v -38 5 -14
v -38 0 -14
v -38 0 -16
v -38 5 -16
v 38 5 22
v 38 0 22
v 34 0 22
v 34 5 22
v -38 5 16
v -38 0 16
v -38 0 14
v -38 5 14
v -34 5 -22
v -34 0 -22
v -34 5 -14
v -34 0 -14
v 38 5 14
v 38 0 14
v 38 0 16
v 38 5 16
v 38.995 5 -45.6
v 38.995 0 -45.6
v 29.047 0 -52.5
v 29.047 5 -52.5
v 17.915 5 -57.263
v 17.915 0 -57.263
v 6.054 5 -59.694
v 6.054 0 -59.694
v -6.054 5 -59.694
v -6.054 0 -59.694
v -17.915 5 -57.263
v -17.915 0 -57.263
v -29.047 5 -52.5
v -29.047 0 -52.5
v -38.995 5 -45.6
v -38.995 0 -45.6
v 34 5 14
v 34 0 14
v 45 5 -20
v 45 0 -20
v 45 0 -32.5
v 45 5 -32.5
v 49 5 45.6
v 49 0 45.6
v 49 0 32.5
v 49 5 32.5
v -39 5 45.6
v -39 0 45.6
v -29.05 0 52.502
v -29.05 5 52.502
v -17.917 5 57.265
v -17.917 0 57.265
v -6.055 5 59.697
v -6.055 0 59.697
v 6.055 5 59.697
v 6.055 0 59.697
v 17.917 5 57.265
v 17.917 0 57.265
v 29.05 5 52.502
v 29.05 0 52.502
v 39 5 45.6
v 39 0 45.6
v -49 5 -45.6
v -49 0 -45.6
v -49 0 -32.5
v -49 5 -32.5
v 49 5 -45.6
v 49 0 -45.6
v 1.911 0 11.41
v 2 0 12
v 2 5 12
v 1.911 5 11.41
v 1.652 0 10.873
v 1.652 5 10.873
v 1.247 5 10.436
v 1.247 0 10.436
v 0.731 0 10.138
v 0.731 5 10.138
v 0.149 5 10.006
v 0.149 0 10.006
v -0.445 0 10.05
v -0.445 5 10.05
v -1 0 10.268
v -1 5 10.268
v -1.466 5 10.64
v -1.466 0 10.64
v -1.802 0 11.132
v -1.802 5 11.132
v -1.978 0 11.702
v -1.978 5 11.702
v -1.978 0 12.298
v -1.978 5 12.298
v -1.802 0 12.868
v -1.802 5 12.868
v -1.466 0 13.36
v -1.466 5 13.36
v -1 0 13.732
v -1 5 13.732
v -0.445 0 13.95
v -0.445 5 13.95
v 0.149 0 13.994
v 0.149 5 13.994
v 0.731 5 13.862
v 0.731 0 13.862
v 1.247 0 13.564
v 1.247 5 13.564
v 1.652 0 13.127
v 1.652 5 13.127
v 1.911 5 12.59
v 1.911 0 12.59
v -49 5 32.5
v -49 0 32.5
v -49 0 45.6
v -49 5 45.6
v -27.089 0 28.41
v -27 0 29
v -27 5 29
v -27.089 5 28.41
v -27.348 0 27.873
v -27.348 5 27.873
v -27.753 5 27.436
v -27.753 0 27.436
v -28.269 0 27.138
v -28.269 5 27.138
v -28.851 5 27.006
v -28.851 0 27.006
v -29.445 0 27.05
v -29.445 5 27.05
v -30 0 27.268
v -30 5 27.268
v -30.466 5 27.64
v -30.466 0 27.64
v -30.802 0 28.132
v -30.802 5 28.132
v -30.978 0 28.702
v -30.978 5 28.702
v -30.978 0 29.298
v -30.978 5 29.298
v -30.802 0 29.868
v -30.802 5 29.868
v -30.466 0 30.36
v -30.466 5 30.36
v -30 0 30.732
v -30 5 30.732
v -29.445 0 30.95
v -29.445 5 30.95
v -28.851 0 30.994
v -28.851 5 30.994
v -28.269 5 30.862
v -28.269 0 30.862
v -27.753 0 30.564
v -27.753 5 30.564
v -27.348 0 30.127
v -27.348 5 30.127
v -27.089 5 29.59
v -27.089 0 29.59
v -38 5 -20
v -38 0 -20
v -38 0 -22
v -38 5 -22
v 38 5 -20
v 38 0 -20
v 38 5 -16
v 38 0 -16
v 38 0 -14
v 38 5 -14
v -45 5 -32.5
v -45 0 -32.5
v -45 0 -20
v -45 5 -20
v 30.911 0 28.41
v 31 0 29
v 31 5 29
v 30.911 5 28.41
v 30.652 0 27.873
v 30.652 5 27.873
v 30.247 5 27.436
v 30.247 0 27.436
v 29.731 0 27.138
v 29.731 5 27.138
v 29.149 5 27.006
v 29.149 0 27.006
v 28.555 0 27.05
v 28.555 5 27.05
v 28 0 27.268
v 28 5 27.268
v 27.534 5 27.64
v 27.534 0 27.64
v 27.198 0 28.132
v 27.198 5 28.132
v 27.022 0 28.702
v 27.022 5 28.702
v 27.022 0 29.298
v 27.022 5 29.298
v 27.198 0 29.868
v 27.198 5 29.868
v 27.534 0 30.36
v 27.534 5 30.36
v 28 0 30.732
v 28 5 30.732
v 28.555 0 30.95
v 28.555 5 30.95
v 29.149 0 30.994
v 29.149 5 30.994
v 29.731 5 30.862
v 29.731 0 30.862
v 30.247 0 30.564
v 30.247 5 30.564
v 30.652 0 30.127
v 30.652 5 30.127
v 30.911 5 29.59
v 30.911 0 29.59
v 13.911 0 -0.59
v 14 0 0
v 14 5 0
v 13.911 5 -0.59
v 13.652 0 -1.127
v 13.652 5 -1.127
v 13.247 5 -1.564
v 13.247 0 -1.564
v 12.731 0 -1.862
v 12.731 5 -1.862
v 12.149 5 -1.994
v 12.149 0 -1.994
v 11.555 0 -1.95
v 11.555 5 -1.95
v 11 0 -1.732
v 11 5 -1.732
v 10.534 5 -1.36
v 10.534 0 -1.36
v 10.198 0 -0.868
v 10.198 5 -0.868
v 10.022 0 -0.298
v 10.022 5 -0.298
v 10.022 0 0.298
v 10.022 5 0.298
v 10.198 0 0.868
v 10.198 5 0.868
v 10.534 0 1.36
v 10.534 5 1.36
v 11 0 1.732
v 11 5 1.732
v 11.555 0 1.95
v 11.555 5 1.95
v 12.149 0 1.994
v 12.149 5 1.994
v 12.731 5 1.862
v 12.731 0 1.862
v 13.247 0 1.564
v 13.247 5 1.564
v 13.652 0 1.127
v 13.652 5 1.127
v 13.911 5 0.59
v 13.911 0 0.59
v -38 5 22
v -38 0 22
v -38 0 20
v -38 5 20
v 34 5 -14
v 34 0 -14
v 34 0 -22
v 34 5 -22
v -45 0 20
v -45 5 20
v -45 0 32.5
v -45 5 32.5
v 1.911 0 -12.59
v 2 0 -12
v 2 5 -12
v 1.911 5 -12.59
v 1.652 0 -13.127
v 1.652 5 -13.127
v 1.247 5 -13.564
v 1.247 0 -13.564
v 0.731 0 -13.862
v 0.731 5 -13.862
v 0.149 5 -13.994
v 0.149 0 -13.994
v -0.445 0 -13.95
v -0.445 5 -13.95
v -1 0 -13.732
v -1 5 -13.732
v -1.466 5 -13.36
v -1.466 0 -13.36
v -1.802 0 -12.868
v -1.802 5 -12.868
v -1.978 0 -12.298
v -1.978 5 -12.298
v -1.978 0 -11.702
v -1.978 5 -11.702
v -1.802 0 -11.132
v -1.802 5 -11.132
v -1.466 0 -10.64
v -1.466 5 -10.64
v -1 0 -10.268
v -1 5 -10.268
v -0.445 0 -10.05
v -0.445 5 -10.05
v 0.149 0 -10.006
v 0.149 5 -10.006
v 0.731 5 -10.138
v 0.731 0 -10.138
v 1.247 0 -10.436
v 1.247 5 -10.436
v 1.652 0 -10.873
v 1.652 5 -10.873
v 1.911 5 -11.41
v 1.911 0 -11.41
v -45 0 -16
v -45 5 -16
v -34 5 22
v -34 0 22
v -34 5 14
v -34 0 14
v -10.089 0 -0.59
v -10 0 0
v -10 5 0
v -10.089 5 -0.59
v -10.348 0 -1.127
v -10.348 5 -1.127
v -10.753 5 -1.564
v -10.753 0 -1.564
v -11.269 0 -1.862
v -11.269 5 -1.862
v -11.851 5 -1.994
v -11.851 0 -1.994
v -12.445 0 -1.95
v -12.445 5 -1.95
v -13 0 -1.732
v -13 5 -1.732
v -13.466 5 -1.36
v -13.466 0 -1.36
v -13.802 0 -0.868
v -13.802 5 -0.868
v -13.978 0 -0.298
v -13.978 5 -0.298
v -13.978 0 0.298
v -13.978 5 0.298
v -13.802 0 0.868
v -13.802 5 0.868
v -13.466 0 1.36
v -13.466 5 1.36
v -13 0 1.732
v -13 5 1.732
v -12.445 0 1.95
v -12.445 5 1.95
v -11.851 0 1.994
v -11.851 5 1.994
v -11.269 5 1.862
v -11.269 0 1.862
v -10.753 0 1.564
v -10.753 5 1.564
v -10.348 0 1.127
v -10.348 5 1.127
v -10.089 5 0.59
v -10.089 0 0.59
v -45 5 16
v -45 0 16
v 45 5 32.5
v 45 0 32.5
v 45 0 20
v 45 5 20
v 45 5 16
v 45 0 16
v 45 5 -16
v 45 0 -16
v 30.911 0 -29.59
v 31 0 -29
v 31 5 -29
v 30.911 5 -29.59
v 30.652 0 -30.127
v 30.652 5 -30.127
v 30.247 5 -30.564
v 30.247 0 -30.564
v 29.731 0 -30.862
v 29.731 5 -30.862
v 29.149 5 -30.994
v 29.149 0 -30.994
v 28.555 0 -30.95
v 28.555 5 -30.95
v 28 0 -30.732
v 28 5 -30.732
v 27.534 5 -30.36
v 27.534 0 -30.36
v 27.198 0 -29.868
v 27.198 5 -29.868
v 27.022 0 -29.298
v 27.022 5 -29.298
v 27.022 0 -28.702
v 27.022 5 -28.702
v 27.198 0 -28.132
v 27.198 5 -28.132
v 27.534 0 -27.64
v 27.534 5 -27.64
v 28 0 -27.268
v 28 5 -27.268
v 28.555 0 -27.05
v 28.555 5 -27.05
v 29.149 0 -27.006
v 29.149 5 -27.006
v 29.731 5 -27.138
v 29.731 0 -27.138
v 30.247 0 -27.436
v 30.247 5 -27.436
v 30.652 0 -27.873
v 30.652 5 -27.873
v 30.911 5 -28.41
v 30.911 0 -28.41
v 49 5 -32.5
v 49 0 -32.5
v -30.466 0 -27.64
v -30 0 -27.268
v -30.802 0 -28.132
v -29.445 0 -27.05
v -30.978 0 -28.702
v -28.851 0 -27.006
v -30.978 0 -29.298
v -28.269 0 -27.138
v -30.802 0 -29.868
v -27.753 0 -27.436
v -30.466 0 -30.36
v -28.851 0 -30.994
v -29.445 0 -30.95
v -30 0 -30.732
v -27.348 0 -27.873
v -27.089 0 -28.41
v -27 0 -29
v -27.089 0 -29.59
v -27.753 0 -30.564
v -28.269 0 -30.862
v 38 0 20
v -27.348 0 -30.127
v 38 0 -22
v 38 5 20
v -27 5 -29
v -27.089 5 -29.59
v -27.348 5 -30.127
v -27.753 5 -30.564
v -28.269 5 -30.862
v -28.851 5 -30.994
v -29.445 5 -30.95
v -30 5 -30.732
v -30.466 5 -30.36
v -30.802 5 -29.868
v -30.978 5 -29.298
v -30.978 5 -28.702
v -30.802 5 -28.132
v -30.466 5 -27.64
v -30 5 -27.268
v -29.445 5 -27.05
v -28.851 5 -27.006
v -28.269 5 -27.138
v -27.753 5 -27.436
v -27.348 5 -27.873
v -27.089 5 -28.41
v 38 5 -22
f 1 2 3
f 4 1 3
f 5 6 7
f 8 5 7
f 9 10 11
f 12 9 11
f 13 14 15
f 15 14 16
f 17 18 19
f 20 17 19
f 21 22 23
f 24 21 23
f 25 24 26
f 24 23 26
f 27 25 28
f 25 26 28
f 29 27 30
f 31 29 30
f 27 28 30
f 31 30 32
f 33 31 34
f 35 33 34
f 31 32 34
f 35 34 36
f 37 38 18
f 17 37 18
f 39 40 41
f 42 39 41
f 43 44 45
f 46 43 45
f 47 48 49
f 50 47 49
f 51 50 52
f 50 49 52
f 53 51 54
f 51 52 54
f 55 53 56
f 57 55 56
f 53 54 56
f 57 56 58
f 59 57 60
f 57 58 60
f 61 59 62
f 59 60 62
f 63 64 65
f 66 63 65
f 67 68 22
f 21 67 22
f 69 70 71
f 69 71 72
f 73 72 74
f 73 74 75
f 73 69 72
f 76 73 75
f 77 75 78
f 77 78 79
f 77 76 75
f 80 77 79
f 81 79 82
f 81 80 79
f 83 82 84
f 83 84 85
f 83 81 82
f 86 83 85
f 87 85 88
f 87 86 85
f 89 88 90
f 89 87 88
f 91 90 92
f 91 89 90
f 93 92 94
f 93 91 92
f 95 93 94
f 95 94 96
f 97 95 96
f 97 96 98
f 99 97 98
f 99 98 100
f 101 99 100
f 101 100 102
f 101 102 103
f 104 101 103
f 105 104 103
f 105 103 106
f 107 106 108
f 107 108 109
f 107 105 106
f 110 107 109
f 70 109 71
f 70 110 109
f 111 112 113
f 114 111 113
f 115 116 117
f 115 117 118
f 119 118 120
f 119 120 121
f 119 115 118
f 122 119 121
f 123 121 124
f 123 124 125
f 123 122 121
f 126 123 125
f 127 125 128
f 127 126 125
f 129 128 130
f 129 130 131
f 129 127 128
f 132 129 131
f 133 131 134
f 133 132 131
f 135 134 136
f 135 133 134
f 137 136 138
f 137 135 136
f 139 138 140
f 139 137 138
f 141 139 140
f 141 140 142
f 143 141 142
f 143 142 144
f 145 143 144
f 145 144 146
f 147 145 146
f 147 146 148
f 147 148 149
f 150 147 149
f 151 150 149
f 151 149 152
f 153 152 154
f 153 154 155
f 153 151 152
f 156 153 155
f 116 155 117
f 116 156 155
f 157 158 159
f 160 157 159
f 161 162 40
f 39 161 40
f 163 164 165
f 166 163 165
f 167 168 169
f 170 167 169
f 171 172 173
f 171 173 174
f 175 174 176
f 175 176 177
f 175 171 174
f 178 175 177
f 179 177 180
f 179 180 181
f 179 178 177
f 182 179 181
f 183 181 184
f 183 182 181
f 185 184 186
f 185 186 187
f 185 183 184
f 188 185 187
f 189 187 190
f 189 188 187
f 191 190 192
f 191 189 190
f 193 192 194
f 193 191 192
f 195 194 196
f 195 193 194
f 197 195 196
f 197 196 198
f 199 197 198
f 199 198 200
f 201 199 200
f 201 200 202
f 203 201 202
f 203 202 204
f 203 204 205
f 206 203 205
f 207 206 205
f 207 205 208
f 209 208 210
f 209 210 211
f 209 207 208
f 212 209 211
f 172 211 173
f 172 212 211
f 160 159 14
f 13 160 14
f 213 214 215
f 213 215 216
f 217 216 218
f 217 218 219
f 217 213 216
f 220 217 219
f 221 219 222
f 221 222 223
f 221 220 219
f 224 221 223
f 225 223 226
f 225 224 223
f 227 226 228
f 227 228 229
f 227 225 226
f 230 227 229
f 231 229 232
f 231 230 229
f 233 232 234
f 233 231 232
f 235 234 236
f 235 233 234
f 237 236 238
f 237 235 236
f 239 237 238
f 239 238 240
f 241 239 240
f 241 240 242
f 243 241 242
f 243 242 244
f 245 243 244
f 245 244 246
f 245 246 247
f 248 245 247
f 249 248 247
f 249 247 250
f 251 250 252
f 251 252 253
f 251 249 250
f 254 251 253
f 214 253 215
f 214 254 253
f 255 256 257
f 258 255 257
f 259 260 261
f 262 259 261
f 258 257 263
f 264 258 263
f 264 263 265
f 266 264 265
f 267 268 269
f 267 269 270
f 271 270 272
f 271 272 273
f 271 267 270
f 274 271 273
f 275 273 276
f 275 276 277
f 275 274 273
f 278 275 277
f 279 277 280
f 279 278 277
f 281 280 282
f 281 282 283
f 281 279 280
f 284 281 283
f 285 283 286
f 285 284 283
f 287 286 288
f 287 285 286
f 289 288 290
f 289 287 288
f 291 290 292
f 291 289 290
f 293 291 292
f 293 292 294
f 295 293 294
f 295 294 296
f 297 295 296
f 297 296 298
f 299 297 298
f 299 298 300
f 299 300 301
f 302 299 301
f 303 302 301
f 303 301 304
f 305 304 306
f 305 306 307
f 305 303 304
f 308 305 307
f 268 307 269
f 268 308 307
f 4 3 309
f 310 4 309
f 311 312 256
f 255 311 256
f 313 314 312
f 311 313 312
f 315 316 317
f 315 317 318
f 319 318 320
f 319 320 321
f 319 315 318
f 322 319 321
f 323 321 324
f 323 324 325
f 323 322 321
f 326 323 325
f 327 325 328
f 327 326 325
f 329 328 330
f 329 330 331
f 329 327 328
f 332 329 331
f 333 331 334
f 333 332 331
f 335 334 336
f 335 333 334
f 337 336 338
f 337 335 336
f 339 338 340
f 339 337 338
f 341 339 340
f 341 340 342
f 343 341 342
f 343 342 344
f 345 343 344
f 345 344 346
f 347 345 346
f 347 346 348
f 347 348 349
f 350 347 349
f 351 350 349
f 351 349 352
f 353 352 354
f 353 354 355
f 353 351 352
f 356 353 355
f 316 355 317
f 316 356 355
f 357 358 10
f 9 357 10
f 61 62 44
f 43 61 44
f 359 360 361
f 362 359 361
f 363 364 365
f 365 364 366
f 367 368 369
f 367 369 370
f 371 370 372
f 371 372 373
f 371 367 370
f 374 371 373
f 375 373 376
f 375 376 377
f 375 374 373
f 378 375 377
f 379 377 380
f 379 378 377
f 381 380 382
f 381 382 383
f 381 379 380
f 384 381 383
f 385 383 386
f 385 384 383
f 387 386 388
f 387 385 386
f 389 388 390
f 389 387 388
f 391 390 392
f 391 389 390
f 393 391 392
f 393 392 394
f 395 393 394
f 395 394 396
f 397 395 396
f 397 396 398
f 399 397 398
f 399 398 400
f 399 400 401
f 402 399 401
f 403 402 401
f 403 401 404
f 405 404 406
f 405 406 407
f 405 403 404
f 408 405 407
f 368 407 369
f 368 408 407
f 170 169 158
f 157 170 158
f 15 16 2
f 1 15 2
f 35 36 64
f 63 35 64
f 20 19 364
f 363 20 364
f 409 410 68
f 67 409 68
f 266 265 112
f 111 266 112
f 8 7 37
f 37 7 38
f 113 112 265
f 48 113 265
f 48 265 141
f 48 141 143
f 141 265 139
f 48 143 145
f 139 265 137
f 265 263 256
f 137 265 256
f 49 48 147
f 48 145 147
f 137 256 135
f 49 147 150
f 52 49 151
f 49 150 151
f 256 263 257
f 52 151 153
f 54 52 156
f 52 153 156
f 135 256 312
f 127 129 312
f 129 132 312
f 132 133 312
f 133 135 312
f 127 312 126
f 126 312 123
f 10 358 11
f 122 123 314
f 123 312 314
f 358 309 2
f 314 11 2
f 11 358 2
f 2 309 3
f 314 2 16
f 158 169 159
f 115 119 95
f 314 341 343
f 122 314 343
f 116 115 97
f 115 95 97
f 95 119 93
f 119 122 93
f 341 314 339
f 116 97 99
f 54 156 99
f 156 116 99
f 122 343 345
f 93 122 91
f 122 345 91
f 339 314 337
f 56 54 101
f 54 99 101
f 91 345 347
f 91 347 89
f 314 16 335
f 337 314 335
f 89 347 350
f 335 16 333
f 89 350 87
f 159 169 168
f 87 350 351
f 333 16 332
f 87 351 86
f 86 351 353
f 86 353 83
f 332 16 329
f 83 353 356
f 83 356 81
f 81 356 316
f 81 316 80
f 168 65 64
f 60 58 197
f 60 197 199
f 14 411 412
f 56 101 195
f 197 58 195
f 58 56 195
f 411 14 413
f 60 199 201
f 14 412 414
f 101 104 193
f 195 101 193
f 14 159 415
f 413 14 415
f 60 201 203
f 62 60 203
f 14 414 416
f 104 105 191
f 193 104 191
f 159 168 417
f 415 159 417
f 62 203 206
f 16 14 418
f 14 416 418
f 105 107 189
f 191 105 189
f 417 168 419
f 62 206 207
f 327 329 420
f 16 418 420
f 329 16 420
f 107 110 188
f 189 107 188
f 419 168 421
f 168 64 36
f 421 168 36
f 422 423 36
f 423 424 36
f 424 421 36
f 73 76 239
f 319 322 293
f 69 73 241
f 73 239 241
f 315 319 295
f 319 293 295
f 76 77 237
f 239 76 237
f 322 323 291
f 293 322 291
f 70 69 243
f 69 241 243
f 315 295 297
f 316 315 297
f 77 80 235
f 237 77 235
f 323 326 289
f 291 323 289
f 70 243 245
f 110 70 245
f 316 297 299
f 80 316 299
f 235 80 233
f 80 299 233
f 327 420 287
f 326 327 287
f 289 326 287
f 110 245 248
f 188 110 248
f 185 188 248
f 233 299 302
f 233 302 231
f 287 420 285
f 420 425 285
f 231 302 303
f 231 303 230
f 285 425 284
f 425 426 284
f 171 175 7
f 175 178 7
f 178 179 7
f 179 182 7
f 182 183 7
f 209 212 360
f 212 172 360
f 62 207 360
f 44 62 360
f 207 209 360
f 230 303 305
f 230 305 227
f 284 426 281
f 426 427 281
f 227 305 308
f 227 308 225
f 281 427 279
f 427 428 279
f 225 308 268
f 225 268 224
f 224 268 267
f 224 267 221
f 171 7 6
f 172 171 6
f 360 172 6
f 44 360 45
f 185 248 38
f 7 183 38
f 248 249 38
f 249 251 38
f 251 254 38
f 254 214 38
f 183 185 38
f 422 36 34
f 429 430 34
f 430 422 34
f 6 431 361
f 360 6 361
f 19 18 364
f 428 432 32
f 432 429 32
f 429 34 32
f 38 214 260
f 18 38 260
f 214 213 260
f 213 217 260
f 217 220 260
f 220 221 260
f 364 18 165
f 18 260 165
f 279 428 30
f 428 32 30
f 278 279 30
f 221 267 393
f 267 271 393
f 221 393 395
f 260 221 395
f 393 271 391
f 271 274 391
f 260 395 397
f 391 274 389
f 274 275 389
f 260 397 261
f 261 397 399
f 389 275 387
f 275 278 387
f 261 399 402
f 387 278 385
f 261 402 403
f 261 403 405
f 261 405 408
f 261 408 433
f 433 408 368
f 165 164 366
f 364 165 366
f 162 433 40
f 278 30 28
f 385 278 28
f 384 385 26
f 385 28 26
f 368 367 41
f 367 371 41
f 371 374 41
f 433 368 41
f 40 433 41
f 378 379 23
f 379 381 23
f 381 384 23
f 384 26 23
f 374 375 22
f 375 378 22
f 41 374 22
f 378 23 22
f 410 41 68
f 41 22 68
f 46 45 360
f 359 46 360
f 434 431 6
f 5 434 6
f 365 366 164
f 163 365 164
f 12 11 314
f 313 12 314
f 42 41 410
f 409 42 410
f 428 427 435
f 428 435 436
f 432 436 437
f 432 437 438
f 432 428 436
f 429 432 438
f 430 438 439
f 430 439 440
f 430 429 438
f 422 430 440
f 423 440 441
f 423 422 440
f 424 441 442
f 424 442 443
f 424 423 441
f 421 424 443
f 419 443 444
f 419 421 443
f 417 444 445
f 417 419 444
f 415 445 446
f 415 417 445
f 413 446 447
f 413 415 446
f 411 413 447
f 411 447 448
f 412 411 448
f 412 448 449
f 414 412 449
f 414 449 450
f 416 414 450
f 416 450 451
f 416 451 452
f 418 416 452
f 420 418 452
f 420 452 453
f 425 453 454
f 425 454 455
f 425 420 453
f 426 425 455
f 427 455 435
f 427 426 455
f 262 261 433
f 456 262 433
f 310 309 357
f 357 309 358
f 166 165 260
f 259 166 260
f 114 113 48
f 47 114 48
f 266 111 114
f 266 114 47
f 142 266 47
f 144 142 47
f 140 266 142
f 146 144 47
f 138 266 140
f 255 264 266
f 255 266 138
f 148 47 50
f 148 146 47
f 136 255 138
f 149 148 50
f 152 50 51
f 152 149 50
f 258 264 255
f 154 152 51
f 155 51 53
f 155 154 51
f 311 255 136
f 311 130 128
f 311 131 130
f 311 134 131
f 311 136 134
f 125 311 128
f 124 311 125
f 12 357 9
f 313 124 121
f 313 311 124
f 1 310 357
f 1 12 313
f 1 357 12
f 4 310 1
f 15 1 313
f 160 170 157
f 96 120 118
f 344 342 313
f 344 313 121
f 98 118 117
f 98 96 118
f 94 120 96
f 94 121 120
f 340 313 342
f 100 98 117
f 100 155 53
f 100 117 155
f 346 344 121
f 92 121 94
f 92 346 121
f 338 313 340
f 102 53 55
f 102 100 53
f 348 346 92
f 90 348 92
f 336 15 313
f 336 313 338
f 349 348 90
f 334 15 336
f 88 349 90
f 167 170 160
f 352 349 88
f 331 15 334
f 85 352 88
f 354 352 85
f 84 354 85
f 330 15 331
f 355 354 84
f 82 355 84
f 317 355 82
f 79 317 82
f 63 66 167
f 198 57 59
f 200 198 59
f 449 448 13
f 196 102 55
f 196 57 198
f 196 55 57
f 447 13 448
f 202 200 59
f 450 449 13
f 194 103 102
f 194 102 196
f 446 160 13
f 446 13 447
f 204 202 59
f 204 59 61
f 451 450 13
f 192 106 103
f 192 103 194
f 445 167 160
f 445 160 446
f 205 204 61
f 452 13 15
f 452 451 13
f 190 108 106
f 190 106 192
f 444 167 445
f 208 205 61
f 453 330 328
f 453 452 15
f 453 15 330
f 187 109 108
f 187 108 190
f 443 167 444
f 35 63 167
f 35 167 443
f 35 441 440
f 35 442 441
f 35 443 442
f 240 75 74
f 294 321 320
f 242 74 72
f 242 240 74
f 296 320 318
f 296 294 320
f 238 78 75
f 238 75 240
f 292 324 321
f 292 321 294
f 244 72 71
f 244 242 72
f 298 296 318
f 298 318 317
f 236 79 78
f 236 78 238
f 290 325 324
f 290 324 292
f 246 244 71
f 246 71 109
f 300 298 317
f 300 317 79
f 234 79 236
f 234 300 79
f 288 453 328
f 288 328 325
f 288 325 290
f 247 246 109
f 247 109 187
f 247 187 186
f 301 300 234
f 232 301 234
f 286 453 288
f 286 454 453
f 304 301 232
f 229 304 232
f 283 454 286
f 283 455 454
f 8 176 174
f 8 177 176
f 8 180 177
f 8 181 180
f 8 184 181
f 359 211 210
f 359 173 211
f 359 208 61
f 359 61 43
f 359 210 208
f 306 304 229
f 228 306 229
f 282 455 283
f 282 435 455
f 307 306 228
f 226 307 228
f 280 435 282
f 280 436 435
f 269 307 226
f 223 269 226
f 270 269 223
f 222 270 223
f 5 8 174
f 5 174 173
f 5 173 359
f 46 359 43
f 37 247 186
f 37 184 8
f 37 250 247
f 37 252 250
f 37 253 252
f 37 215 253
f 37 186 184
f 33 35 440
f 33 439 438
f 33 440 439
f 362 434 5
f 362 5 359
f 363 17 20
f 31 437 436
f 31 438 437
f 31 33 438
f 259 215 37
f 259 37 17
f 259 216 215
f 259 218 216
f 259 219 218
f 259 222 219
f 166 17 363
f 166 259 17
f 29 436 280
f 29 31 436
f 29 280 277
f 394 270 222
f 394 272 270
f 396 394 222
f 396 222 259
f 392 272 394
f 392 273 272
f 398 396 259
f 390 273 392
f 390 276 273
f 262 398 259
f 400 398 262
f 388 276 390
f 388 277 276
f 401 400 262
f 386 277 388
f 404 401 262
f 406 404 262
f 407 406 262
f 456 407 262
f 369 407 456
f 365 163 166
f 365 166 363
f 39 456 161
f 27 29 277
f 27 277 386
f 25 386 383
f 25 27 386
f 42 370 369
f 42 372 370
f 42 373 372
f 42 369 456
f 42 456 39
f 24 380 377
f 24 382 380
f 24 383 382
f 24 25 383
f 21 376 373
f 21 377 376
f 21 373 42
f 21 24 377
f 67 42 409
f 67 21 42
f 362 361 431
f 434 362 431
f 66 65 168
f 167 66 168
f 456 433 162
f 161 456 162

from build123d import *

# Parameters (mm, degrees)
SKETCH1_R           = 2
BOSS_EXTRUDE1_DEPTH = 5


with BuildPart() as part:
    # Sketch1 → Boss-Extrude1 (new body)
    with BuildSketch(Plane(origin=(0, 0, 0), x_dir=(1, 0, 0), z_dir=(0, 1, 0))):
        with BuildLine():
            Line((-49, 45.6), (-49, 32.5))
            Line((-49, 32.5), (-45, 32.5))
            Line((-45, 32.5), (-45, 20))
            Line((-45, 20), (-38, 20))
            Line((-38, 20), (-38, 22))
            Line((-38, 22), (-34, 22))
            Line((-34, 22), (-34, 14))
            Line((-34, 14), (-38, 14))
            Line((-38, 14), (-38, 16))
            Line((-38, 16), (-45, 16))
            Line((-45, 16), (-45, -16))
            Line((-45, -16), (-38, -16))
            Line((-38, -16), (-38, -14))
            Line((-38, -14), (-34, -14))
            Line((-34, -14), (-34, -22))
            Line((-34, -22), (-38, -22))
            Line((-38, -22), (-38, -20))
            Line((-38, -20), (-45, -20))
            Line((-45, -20), (-45, -32.5))
            Line((-45, -32.5), (-49, -32.5))
            Line((-49, -32.5), (-49, -45.6))
            Line((-49, -45.6), (-39, -45.6))
            ThreePointArc((-39, -45.6), (0, -60.002999925), (39, -45.6))
            Line((39, -45.6), (49, -45.6))
            Line((49, -45.6), (49, -32.5))
            Line((49, -32.5), (45, -32.5))
            Line((45, -32.5), (45, -20))
            Line((45, -20), (38, -20))
            Line((38, -20), (38, -22))
            Line((38, -22), (34, -22))
            Line((34, -22), (34, -14))
            Line((34, -14), (38, -14))
            Line((38, -14), (38, -16))
            Line((38, -16), (45, -16))
            Line((45, -16), (45, 16))
            Line((45, 16), (38, 16))
            Line((38, 16), (38, 14))
            Line((38, 14), (34, 14))
            Line((34, 14), (34, 22))
            Line((34, 22), (38, 22))
            Line((38, 22), (38, 20))
            Line((38, 20), (45, 20))
            Line((45, 20), (45, 32.5))
            Line((45, 32.5), (49, 32.5))
            Line((49, 32.5), (49, 45.6))
            Line((49, 45.6), (38.995384342, 45.6))
            ThreePointArc((38.995384342, 45.6), (0, 60), (-38.995384342, 45.6))
            Line((-38.995384342, 45.6), (-49, 45.6))
        make_face()
        with Locations((-12, 0)):
            Circle(SKETCH1_R, mode=Mode.SUBTRACT)
        with Locations((0, 12)):
            Circle(SKETCH1_R, mode=Mode.SUBTRACT)
        with Locations((12, 0)):
            Circle(SKETCH1_R, mode=Mode.SUBTRACT)
        with Locations((0, -12)):
            Circle(SKETCH1_R, mode=Mode.SUBTRACT)
        with Locations((29, 29)):
            Circle(SKETCH1_R, mode=Mode.SUBTRACT)
        with Locations((29, -29)):
            Circle(SKETCH1_R, mode=Mode.SUBTRACT)
        with Locations((-29, -29)):
            Circle(SKETCH1_R, mode=Mode.SUBTRACT)
        with Locations((-29, 29)):
            Circle(SKETCH1_R, mode=Mode.SUBTRACT)
    extrude(amount=BOSS_EXTRUDE1_DEPTH)


solid = part.part
